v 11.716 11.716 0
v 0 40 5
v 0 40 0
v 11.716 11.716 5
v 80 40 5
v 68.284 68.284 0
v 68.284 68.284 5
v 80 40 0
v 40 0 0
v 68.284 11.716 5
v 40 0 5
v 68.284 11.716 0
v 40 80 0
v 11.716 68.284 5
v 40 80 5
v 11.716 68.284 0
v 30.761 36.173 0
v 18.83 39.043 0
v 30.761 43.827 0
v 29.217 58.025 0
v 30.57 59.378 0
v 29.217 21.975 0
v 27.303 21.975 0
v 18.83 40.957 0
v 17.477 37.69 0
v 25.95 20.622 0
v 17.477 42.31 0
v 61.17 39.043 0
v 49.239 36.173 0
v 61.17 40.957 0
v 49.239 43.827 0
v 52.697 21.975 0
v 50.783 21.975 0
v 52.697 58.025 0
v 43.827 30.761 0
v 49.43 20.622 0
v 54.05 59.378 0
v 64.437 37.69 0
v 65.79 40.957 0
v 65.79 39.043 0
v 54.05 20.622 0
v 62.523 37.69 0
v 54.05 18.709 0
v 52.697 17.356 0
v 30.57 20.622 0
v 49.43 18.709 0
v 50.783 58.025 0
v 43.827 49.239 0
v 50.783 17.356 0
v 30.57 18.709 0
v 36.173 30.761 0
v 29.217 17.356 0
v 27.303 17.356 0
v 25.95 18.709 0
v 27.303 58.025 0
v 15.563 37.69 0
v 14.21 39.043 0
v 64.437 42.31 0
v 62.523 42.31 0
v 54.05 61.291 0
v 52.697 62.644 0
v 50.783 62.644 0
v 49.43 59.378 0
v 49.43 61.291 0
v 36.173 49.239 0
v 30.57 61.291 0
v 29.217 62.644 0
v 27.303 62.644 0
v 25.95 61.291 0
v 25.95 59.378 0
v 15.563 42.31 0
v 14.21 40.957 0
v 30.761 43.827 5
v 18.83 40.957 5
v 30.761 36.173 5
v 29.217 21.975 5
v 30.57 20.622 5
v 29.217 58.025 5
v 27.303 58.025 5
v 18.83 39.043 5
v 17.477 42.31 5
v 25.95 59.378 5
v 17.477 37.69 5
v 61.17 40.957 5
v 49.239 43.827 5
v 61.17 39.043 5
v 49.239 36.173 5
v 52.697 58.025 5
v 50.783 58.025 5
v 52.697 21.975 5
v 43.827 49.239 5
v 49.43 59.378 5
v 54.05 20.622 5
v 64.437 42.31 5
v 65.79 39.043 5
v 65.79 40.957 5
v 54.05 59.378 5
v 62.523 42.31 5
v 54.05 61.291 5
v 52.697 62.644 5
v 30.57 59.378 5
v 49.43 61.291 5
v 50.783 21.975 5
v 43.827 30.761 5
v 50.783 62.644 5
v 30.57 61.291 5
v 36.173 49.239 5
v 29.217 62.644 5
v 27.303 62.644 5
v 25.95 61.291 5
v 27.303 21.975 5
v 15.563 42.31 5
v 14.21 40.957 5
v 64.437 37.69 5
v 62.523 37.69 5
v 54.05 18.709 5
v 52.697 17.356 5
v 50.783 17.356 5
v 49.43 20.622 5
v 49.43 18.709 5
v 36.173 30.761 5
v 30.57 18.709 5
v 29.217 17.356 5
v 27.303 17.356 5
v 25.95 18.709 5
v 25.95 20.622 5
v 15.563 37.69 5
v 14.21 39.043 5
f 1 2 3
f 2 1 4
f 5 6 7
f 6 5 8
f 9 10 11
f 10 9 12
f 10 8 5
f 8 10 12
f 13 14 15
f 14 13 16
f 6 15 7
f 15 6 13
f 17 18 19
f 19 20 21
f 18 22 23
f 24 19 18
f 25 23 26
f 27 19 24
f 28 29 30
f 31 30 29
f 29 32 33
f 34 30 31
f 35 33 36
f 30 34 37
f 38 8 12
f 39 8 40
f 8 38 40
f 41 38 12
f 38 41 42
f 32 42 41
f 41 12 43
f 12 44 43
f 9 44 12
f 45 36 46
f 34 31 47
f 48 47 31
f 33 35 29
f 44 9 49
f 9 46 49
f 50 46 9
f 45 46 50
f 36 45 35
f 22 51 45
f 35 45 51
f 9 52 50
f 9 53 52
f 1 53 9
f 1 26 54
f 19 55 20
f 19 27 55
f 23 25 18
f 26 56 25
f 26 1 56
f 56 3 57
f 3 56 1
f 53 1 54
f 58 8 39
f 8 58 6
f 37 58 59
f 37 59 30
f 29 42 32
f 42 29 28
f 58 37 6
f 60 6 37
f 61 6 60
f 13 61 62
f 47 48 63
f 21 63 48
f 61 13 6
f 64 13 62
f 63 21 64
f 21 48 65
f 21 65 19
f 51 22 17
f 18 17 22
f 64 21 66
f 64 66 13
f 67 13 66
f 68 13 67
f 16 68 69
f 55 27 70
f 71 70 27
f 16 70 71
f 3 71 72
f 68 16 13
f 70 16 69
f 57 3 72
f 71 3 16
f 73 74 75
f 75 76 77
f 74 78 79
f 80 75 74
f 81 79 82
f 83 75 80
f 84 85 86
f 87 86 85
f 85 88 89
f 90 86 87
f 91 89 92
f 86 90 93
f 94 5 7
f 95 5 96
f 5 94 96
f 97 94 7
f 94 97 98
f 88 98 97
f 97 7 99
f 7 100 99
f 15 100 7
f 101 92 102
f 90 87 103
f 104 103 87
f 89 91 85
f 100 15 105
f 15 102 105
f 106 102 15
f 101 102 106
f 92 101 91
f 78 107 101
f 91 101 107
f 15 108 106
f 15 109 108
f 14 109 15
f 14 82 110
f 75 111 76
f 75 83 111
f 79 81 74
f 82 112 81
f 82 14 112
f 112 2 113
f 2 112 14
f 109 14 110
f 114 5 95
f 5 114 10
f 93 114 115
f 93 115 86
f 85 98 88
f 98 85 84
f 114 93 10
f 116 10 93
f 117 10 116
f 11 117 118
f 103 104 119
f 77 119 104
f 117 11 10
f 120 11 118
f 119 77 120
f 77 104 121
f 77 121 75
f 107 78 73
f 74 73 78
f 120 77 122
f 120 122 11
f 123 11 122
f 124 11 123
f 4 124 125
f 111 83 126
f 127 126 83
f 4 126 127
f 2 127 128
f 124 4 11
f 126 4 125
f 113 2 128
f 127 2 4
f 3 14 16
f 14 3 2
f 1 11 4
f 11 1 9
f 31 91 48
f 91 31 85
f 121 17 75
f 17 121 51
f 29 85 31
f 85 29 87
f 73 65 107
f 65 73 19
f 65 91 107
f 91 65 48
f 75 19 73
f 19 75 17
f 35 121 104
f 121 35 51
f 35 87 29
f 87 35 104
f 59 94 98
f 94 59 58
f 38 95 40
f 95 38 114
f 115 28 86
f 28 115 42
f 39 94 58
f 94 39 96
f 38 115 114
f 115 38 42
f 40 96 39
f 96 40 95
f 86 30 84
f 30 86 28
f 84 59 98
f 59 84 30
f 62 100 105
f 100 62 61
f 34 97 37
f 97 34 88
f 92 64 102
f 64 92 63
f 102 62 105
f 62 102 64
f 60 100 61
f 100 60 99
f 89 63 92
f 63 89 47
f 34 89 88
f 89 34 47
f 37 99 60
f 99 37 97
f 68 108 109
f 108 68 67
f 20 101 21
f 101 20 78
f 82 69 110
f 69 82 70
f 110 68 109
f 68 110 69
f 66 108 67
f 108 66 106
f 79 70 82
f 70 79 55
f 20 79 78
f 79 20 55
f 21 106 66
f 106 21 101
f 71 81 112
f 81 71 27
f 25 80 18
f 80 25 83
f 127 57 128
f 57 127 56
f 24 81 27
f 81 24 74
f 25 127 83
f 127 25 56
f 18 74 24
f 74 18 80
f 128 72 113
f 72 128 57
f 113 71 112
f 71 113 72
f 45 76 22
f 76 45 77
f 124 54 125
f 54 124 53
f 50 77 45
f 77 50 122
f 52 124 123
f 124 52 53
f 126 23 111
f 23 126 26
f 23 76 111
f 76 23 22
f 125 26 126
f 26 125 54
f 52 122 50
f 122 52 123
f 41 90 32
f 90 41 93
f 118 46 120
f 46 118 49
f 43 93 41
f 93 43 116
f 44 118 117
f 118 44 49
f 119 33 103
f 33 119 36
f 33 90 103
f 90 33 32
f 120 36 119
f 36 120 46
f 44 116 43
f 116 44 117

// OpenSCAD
$fn = 32;

// ----------------------------------------------------------------------
// Polygon plate: 8-gon R40, 6 bolt windows
// ----------------------------------------------------------------------

// --- parameters (mm) ---
sides = 8;                // number of polygon sides
plate_r = 40;             // circumscribed radius of the polygon
bore_r = 10;              // centre bore radius
bolts = 6;                // number of bolt windows
ring_r = 23.48;           // bolt-circle radius
bolt_r = 2.5;             // bolt window radius
plate_t = 5;              // plate thickness, Z (extrusion height)

plate_d = 2 * plate_r;  // circumscribed diameter
bore_d = 2 * bore_r;  // centre bore diameter
bolt_d = 2 * bolt_r;  // bolt window diameter
ring_d = 2 * ring_r;  // bolt-circle diameter

profile = [[80, 40], [68.284, 68.284], [40, 80], [11.716, 68.284], [0, 40], [11.716, 11.716], [40, 0], [68.284, 11.716]];  // primary outline, 8 points, counter clockwise
void_1 = [[49.239, 43.827], [43.827, 49.239], [36.173, 49.239], [30.761, 43.827], [30.761, 36.173], [36.173, 30.761], [43.827, 30.761], [49.239, 36.173]];  // centre bore, 8 points
void_2 = [[65.79, 40.957], [64.437, 42.31], [62.523, 42.31], [61.17, 40.957], [61.17, 39.043], [62.523, 37.69], [64.437, 37.69], [65.79, 39.043]];  // bolt window 1, 8 points
void_3 = [[54.05, 61.291], [52.697, 62.644], [50.783, 62.644], [49.43, 61.291], [49.43, 59.378], [50.783, 58.025], [52.697, 58.025], [54.05, 59.378]];  // bolt window 2, 8 points
void_4 = [[30.57, 61.291], [29.217, 62.644], [27.303, 62.644], [25.95, 61.291], [25.95, 59.378], [27.303, 58.025], [29.217, 58.025], [30.57, 59.378]];  // bolt window 3, 8 points
void_5 = [[18.83, 40.957], [17.477, 42.31], [15.563, 42.31], [14.21, 40.957], [14.21, 39.043], [15.563, 37.69], [17.477, 37.69], [18.83, 39.043]];  // bolt window 4, 8 points
void_6 = [[30.57, 20.622], [29.217, 21.975], [27.303, 21.975], [25.95, 20.622], [25.95, 18.709], [27.303, 17.356], [29.217, 17.356], [30.57, 18.709]];  // bolt window 5, 8 points
void_7 = [[54.05, 20.622], [52.697, 21.975], [50.783, 21.975], [49.43, 20.622], [49.43, 18.709], [50.783, 17.356], [52.697, 17.356], [54.05, 18.709]];  // bolt window 6, 8 points

// --- the one profile operation ---
difference() {
  linear_extrude(height = plate_t) polygon(points = profile);
  translate([0, 0, -1])
    linear_extrude(height = plate_t + 2) polygon(points = void_1);
  translate([0, 0, -1])
    linear_extrude(height = plate_t + 2) polygon(points = void_2);
  translate([0, 0, -1])
    linear_extrude(height = plate_t + 2) polygon(points = void_3);
  translate([0, 0, -1])
    linear_extrude(height = plate_t + 2) polygon(points = void_4);
  translate([0, 0, -1])
    linear_extrude(height = plate_t + 2) polygon(points = void_5);
  translate([0, 0, -1])
    linear_extrude(height = plate_t + 2) polygon(points = void_6);
  translate([0, 0, -1])
    linear_extrude(height = plate_t + 2) polygon(points = void_7);
}
